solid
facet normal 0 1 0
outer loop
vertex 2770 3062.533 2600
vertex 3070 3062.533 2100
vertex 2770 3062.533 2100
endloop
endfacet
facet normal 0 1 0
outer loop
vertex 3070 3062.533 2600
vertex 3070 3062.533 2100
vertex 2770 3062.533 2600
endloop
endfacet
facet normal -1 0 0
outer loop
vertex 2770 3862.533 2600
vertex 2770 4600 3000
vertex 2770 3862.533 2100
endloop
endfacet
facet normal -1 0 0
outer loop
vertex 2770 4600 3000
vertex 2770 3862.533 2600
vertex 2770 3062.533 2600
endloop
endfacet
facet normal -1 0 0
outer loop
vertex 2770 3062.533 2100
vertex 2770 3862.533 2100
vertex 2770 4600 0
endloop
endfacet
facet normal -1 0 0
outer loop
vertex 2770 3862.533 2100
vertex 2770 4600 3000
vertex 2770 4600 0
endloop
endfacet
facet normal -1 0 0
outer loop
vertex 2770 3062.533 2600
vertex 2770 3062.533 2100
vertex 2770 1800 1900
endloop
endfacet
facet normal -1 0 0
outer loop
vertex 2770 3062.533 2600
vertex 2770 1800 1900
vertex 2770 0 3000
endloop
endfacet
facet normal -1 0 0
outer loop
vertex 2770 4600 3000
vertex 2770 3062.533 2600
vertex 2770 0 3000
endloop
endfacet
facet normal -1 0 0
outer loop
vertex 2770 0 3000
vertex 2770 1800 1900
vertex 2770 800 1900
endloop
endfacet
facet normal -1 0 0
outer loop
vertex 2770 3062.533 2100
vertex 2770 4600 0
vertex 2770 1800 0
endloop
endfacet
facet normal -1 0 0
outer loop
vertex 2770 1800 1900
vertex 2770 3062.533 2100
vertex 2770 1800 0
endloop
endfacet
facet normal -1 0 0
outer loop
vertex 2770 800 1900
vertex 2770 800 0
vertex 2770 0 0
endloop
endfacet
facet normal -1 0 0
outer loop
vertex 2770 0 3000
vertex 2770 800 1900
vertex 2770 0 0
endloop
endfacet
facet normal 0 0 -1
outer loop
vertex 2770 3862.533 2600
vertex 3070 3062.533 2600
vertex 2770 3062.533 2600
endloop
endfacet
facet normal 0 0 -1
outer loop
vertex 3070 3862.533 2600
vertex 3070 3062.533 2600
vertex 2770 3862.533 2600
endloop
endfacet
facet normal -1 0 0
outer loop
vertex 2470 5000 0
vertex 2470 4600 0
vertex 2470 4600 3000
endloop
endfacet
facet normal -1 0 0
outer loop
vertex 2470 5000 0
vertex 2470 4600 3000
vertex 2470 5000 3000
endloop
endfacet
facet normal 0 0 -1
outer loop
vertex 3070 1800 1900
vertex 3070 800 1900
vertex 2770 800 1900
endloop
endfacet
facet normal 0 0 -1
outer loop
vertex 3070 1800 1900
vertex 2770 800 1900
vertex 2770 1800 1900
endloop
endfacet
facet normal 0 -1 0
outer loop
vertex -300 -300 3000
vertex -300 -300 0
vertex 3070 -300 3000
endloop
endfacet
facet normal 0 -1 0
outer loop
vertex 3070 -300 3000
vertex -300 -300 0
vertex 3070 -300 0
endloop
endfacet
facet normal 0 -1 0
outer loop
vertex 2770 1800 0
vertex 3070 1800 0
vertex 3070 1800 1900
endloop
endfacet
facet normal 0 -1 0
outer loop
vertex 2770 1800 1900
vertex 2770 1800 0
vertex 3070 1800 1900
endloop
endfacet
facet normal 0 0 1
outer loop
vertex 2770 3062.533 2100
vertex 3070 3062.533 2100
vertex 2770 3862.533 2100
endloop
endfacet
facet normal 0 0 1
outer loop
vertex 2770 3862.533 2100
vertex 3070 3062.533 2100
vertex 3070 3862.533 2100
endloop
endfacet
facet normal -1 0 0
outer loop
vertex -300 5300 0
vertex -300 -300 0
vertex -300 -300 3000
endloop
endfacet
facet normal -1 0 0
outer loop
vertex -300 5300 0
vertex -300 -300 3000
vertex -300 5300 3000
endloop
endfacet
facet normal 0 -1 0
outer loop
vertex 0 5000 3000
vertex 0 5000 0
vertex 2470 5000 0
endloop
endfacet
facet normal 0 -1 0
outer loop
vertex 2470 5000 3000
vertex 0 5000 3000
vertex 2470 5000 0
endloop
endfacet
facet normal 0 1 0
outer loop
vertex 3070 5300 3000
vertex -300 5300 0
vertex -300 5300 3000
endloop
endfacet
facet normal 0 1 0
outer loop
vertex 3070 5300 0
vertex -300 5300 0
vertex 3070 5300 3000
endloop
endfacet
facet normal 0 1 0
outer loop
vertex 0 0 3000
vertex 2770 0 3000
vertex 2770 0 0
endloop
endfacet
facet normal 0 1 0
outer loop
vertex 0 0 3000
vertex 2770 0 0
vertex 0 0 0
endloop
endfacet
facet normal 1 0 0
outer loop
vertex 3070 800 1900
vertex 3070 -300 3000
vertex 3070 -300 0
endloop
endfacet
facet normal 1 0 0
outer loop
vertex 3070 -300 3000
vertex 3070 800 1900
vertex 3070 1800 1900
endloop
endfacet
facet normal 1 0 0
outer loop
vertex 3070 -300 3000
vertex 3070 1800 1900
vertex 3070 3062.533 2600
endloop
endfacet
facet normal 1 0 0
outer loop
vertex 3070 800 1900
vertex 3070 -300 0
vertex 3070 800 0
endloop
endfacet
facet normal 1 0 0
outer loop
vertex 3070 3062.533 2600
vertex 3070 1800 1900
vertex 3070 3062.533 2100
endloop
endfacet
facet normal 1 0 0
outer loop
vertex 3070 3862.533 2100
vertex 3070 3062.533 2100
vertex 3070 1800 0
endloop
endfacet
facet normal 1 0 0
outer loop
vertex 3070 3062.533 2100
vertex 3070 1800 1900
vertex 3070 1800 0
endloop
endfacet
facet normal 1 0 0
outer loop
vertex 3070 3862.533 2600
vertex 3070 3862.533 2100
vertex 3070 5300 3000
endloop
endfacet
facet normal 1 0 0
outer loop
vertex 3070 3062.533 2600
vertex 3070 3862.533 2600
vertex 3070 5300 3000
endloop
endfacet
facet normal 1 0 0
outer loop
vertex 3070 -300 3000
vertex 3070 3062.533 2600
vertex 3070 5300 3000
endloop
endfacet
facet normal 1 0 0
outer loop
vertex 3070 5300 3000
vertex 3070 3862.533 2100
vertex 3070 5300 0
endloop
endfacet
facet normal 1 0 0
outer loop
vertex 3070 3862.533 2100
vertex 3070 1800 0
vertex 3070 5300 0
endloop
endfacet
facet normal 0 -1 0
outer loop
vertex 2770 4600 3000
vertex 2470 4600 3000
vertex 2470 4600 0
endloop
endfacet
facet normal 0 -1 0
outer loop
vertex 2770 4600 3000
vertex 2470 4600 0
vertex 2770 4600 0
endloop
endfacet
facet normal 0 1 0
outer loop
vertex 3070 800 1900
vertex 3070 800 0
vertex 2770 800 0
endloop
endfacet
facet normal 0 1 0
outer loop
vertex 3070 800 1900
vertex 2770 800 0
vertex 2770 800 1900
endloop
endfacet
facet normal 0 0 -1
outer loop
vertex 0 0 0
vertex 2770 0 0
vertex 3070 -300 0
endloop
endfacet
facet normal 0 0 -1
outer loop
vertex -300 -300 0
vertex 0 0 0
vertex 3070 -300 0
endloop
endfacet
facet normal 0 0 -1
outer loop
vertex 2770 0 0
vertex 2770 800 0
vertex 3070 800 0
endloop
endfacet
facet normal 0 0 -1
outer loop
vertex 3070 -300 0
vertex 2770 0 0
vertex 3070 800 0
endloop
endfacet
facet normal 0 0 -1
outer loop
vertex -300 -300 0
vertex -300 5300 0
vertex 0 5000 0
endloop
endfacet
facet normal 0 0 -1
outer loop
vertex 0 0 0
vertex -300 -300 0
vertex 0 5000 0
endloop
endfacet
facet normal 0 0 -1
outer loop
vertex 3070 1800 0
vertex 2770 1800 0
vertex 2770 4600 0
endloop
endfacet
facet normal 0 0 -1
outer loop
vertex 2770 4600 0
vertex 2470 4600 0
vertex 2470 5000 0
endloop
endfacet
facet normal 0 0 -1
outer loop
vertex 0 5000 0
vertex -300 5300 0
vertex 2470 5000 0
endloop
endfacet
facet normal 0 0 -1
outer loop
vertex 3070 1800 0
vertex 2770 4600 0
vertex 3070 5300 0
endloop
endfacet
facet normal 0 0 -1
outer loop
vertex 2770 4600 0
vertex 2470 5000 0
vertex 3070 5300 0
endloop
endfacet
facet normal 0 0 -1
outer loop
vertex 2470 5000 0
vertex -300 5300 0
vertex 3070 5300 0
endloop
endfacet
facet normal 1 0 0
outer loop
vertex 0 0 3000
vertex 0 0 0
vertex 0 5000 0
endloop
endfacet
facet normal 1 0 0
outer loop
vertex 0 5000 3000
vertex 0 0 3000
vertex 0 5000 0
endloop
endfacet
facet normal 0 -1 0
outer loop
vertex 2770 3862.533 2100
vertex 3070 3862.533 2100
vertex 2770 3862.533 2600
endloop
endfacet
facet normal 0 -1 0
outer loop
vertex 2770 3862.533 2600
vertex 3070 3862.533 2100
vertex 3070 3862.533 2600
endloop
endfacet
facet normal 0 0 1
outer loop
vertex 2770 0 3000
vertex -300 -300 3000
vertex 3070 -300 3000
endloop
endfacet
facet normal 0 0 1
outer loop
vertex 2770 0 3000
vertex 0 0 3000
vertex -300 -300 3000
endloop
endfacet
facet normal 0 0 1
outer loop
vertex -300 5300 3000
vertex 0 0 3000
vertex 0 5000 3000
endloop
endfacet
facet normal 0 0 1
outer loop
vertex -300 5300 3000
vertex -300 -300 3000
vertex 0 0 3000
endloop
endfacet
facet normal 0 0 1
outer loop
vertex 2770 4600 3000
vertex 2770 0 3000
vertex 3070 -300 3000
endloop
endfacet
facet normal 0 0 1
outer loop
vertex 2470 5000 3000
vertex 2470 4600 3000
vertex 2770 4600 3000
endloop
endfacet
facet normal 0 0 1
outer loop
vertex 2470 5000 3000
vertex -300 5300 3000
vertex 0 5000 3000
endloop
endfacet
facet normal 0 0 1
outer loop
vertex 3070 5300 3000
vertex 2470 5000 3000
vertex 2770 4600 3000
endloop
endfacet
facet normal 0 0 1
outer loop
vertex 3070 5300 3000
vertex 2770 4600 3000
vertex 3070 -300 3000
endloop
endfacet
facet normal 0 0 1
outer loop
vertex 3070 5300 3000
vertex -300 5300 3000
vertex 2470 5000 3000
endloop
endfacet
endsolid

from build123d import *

# Parameters (mm, degrees)
F0_W     = 3370
F0_H     = 5600
F0_W_2   = 300
F0_H_2   = 400
F1_DEPTH = 3000
F2_W     = 1000
F2_H     = 1900
F2_W_2   = 800
F2_H_2   = 500
F3_DEPTH = 300


with BuildPart() as f1:
    # F0 (on Top) → F1 (new body)
    with BuildSketch(Plane.XY):
        with Locations((1385, 2500)):
            Rectangle(F0_W, F0_H)
        Polygon((2770, 0), (0, 0), (0, 5000), (2470, 5000), (2770, 5000), (2770, 4600), align=None, mode=Mode.SUBTRACT)
        with Locations((2620, 4800)):
            Rectangle(F0_W_2, F0_H_2)
    extrude(amount=F1_DEPTH)

    # F2 (on face) → F3 (cut, through all)
    with BuildSketch(Plane.YZ.offset(3070)):
        with Locations((1300, 950)):
            Rectangle(F2_W, F2_H)
        with Locations((3462.532663, 2350)):
            Rectangle(F2_W_2, F2_H_2)
    extrude(amount=-F3_DEPTH, mode=Mode.SUBTRACT)


solid = f1.part
